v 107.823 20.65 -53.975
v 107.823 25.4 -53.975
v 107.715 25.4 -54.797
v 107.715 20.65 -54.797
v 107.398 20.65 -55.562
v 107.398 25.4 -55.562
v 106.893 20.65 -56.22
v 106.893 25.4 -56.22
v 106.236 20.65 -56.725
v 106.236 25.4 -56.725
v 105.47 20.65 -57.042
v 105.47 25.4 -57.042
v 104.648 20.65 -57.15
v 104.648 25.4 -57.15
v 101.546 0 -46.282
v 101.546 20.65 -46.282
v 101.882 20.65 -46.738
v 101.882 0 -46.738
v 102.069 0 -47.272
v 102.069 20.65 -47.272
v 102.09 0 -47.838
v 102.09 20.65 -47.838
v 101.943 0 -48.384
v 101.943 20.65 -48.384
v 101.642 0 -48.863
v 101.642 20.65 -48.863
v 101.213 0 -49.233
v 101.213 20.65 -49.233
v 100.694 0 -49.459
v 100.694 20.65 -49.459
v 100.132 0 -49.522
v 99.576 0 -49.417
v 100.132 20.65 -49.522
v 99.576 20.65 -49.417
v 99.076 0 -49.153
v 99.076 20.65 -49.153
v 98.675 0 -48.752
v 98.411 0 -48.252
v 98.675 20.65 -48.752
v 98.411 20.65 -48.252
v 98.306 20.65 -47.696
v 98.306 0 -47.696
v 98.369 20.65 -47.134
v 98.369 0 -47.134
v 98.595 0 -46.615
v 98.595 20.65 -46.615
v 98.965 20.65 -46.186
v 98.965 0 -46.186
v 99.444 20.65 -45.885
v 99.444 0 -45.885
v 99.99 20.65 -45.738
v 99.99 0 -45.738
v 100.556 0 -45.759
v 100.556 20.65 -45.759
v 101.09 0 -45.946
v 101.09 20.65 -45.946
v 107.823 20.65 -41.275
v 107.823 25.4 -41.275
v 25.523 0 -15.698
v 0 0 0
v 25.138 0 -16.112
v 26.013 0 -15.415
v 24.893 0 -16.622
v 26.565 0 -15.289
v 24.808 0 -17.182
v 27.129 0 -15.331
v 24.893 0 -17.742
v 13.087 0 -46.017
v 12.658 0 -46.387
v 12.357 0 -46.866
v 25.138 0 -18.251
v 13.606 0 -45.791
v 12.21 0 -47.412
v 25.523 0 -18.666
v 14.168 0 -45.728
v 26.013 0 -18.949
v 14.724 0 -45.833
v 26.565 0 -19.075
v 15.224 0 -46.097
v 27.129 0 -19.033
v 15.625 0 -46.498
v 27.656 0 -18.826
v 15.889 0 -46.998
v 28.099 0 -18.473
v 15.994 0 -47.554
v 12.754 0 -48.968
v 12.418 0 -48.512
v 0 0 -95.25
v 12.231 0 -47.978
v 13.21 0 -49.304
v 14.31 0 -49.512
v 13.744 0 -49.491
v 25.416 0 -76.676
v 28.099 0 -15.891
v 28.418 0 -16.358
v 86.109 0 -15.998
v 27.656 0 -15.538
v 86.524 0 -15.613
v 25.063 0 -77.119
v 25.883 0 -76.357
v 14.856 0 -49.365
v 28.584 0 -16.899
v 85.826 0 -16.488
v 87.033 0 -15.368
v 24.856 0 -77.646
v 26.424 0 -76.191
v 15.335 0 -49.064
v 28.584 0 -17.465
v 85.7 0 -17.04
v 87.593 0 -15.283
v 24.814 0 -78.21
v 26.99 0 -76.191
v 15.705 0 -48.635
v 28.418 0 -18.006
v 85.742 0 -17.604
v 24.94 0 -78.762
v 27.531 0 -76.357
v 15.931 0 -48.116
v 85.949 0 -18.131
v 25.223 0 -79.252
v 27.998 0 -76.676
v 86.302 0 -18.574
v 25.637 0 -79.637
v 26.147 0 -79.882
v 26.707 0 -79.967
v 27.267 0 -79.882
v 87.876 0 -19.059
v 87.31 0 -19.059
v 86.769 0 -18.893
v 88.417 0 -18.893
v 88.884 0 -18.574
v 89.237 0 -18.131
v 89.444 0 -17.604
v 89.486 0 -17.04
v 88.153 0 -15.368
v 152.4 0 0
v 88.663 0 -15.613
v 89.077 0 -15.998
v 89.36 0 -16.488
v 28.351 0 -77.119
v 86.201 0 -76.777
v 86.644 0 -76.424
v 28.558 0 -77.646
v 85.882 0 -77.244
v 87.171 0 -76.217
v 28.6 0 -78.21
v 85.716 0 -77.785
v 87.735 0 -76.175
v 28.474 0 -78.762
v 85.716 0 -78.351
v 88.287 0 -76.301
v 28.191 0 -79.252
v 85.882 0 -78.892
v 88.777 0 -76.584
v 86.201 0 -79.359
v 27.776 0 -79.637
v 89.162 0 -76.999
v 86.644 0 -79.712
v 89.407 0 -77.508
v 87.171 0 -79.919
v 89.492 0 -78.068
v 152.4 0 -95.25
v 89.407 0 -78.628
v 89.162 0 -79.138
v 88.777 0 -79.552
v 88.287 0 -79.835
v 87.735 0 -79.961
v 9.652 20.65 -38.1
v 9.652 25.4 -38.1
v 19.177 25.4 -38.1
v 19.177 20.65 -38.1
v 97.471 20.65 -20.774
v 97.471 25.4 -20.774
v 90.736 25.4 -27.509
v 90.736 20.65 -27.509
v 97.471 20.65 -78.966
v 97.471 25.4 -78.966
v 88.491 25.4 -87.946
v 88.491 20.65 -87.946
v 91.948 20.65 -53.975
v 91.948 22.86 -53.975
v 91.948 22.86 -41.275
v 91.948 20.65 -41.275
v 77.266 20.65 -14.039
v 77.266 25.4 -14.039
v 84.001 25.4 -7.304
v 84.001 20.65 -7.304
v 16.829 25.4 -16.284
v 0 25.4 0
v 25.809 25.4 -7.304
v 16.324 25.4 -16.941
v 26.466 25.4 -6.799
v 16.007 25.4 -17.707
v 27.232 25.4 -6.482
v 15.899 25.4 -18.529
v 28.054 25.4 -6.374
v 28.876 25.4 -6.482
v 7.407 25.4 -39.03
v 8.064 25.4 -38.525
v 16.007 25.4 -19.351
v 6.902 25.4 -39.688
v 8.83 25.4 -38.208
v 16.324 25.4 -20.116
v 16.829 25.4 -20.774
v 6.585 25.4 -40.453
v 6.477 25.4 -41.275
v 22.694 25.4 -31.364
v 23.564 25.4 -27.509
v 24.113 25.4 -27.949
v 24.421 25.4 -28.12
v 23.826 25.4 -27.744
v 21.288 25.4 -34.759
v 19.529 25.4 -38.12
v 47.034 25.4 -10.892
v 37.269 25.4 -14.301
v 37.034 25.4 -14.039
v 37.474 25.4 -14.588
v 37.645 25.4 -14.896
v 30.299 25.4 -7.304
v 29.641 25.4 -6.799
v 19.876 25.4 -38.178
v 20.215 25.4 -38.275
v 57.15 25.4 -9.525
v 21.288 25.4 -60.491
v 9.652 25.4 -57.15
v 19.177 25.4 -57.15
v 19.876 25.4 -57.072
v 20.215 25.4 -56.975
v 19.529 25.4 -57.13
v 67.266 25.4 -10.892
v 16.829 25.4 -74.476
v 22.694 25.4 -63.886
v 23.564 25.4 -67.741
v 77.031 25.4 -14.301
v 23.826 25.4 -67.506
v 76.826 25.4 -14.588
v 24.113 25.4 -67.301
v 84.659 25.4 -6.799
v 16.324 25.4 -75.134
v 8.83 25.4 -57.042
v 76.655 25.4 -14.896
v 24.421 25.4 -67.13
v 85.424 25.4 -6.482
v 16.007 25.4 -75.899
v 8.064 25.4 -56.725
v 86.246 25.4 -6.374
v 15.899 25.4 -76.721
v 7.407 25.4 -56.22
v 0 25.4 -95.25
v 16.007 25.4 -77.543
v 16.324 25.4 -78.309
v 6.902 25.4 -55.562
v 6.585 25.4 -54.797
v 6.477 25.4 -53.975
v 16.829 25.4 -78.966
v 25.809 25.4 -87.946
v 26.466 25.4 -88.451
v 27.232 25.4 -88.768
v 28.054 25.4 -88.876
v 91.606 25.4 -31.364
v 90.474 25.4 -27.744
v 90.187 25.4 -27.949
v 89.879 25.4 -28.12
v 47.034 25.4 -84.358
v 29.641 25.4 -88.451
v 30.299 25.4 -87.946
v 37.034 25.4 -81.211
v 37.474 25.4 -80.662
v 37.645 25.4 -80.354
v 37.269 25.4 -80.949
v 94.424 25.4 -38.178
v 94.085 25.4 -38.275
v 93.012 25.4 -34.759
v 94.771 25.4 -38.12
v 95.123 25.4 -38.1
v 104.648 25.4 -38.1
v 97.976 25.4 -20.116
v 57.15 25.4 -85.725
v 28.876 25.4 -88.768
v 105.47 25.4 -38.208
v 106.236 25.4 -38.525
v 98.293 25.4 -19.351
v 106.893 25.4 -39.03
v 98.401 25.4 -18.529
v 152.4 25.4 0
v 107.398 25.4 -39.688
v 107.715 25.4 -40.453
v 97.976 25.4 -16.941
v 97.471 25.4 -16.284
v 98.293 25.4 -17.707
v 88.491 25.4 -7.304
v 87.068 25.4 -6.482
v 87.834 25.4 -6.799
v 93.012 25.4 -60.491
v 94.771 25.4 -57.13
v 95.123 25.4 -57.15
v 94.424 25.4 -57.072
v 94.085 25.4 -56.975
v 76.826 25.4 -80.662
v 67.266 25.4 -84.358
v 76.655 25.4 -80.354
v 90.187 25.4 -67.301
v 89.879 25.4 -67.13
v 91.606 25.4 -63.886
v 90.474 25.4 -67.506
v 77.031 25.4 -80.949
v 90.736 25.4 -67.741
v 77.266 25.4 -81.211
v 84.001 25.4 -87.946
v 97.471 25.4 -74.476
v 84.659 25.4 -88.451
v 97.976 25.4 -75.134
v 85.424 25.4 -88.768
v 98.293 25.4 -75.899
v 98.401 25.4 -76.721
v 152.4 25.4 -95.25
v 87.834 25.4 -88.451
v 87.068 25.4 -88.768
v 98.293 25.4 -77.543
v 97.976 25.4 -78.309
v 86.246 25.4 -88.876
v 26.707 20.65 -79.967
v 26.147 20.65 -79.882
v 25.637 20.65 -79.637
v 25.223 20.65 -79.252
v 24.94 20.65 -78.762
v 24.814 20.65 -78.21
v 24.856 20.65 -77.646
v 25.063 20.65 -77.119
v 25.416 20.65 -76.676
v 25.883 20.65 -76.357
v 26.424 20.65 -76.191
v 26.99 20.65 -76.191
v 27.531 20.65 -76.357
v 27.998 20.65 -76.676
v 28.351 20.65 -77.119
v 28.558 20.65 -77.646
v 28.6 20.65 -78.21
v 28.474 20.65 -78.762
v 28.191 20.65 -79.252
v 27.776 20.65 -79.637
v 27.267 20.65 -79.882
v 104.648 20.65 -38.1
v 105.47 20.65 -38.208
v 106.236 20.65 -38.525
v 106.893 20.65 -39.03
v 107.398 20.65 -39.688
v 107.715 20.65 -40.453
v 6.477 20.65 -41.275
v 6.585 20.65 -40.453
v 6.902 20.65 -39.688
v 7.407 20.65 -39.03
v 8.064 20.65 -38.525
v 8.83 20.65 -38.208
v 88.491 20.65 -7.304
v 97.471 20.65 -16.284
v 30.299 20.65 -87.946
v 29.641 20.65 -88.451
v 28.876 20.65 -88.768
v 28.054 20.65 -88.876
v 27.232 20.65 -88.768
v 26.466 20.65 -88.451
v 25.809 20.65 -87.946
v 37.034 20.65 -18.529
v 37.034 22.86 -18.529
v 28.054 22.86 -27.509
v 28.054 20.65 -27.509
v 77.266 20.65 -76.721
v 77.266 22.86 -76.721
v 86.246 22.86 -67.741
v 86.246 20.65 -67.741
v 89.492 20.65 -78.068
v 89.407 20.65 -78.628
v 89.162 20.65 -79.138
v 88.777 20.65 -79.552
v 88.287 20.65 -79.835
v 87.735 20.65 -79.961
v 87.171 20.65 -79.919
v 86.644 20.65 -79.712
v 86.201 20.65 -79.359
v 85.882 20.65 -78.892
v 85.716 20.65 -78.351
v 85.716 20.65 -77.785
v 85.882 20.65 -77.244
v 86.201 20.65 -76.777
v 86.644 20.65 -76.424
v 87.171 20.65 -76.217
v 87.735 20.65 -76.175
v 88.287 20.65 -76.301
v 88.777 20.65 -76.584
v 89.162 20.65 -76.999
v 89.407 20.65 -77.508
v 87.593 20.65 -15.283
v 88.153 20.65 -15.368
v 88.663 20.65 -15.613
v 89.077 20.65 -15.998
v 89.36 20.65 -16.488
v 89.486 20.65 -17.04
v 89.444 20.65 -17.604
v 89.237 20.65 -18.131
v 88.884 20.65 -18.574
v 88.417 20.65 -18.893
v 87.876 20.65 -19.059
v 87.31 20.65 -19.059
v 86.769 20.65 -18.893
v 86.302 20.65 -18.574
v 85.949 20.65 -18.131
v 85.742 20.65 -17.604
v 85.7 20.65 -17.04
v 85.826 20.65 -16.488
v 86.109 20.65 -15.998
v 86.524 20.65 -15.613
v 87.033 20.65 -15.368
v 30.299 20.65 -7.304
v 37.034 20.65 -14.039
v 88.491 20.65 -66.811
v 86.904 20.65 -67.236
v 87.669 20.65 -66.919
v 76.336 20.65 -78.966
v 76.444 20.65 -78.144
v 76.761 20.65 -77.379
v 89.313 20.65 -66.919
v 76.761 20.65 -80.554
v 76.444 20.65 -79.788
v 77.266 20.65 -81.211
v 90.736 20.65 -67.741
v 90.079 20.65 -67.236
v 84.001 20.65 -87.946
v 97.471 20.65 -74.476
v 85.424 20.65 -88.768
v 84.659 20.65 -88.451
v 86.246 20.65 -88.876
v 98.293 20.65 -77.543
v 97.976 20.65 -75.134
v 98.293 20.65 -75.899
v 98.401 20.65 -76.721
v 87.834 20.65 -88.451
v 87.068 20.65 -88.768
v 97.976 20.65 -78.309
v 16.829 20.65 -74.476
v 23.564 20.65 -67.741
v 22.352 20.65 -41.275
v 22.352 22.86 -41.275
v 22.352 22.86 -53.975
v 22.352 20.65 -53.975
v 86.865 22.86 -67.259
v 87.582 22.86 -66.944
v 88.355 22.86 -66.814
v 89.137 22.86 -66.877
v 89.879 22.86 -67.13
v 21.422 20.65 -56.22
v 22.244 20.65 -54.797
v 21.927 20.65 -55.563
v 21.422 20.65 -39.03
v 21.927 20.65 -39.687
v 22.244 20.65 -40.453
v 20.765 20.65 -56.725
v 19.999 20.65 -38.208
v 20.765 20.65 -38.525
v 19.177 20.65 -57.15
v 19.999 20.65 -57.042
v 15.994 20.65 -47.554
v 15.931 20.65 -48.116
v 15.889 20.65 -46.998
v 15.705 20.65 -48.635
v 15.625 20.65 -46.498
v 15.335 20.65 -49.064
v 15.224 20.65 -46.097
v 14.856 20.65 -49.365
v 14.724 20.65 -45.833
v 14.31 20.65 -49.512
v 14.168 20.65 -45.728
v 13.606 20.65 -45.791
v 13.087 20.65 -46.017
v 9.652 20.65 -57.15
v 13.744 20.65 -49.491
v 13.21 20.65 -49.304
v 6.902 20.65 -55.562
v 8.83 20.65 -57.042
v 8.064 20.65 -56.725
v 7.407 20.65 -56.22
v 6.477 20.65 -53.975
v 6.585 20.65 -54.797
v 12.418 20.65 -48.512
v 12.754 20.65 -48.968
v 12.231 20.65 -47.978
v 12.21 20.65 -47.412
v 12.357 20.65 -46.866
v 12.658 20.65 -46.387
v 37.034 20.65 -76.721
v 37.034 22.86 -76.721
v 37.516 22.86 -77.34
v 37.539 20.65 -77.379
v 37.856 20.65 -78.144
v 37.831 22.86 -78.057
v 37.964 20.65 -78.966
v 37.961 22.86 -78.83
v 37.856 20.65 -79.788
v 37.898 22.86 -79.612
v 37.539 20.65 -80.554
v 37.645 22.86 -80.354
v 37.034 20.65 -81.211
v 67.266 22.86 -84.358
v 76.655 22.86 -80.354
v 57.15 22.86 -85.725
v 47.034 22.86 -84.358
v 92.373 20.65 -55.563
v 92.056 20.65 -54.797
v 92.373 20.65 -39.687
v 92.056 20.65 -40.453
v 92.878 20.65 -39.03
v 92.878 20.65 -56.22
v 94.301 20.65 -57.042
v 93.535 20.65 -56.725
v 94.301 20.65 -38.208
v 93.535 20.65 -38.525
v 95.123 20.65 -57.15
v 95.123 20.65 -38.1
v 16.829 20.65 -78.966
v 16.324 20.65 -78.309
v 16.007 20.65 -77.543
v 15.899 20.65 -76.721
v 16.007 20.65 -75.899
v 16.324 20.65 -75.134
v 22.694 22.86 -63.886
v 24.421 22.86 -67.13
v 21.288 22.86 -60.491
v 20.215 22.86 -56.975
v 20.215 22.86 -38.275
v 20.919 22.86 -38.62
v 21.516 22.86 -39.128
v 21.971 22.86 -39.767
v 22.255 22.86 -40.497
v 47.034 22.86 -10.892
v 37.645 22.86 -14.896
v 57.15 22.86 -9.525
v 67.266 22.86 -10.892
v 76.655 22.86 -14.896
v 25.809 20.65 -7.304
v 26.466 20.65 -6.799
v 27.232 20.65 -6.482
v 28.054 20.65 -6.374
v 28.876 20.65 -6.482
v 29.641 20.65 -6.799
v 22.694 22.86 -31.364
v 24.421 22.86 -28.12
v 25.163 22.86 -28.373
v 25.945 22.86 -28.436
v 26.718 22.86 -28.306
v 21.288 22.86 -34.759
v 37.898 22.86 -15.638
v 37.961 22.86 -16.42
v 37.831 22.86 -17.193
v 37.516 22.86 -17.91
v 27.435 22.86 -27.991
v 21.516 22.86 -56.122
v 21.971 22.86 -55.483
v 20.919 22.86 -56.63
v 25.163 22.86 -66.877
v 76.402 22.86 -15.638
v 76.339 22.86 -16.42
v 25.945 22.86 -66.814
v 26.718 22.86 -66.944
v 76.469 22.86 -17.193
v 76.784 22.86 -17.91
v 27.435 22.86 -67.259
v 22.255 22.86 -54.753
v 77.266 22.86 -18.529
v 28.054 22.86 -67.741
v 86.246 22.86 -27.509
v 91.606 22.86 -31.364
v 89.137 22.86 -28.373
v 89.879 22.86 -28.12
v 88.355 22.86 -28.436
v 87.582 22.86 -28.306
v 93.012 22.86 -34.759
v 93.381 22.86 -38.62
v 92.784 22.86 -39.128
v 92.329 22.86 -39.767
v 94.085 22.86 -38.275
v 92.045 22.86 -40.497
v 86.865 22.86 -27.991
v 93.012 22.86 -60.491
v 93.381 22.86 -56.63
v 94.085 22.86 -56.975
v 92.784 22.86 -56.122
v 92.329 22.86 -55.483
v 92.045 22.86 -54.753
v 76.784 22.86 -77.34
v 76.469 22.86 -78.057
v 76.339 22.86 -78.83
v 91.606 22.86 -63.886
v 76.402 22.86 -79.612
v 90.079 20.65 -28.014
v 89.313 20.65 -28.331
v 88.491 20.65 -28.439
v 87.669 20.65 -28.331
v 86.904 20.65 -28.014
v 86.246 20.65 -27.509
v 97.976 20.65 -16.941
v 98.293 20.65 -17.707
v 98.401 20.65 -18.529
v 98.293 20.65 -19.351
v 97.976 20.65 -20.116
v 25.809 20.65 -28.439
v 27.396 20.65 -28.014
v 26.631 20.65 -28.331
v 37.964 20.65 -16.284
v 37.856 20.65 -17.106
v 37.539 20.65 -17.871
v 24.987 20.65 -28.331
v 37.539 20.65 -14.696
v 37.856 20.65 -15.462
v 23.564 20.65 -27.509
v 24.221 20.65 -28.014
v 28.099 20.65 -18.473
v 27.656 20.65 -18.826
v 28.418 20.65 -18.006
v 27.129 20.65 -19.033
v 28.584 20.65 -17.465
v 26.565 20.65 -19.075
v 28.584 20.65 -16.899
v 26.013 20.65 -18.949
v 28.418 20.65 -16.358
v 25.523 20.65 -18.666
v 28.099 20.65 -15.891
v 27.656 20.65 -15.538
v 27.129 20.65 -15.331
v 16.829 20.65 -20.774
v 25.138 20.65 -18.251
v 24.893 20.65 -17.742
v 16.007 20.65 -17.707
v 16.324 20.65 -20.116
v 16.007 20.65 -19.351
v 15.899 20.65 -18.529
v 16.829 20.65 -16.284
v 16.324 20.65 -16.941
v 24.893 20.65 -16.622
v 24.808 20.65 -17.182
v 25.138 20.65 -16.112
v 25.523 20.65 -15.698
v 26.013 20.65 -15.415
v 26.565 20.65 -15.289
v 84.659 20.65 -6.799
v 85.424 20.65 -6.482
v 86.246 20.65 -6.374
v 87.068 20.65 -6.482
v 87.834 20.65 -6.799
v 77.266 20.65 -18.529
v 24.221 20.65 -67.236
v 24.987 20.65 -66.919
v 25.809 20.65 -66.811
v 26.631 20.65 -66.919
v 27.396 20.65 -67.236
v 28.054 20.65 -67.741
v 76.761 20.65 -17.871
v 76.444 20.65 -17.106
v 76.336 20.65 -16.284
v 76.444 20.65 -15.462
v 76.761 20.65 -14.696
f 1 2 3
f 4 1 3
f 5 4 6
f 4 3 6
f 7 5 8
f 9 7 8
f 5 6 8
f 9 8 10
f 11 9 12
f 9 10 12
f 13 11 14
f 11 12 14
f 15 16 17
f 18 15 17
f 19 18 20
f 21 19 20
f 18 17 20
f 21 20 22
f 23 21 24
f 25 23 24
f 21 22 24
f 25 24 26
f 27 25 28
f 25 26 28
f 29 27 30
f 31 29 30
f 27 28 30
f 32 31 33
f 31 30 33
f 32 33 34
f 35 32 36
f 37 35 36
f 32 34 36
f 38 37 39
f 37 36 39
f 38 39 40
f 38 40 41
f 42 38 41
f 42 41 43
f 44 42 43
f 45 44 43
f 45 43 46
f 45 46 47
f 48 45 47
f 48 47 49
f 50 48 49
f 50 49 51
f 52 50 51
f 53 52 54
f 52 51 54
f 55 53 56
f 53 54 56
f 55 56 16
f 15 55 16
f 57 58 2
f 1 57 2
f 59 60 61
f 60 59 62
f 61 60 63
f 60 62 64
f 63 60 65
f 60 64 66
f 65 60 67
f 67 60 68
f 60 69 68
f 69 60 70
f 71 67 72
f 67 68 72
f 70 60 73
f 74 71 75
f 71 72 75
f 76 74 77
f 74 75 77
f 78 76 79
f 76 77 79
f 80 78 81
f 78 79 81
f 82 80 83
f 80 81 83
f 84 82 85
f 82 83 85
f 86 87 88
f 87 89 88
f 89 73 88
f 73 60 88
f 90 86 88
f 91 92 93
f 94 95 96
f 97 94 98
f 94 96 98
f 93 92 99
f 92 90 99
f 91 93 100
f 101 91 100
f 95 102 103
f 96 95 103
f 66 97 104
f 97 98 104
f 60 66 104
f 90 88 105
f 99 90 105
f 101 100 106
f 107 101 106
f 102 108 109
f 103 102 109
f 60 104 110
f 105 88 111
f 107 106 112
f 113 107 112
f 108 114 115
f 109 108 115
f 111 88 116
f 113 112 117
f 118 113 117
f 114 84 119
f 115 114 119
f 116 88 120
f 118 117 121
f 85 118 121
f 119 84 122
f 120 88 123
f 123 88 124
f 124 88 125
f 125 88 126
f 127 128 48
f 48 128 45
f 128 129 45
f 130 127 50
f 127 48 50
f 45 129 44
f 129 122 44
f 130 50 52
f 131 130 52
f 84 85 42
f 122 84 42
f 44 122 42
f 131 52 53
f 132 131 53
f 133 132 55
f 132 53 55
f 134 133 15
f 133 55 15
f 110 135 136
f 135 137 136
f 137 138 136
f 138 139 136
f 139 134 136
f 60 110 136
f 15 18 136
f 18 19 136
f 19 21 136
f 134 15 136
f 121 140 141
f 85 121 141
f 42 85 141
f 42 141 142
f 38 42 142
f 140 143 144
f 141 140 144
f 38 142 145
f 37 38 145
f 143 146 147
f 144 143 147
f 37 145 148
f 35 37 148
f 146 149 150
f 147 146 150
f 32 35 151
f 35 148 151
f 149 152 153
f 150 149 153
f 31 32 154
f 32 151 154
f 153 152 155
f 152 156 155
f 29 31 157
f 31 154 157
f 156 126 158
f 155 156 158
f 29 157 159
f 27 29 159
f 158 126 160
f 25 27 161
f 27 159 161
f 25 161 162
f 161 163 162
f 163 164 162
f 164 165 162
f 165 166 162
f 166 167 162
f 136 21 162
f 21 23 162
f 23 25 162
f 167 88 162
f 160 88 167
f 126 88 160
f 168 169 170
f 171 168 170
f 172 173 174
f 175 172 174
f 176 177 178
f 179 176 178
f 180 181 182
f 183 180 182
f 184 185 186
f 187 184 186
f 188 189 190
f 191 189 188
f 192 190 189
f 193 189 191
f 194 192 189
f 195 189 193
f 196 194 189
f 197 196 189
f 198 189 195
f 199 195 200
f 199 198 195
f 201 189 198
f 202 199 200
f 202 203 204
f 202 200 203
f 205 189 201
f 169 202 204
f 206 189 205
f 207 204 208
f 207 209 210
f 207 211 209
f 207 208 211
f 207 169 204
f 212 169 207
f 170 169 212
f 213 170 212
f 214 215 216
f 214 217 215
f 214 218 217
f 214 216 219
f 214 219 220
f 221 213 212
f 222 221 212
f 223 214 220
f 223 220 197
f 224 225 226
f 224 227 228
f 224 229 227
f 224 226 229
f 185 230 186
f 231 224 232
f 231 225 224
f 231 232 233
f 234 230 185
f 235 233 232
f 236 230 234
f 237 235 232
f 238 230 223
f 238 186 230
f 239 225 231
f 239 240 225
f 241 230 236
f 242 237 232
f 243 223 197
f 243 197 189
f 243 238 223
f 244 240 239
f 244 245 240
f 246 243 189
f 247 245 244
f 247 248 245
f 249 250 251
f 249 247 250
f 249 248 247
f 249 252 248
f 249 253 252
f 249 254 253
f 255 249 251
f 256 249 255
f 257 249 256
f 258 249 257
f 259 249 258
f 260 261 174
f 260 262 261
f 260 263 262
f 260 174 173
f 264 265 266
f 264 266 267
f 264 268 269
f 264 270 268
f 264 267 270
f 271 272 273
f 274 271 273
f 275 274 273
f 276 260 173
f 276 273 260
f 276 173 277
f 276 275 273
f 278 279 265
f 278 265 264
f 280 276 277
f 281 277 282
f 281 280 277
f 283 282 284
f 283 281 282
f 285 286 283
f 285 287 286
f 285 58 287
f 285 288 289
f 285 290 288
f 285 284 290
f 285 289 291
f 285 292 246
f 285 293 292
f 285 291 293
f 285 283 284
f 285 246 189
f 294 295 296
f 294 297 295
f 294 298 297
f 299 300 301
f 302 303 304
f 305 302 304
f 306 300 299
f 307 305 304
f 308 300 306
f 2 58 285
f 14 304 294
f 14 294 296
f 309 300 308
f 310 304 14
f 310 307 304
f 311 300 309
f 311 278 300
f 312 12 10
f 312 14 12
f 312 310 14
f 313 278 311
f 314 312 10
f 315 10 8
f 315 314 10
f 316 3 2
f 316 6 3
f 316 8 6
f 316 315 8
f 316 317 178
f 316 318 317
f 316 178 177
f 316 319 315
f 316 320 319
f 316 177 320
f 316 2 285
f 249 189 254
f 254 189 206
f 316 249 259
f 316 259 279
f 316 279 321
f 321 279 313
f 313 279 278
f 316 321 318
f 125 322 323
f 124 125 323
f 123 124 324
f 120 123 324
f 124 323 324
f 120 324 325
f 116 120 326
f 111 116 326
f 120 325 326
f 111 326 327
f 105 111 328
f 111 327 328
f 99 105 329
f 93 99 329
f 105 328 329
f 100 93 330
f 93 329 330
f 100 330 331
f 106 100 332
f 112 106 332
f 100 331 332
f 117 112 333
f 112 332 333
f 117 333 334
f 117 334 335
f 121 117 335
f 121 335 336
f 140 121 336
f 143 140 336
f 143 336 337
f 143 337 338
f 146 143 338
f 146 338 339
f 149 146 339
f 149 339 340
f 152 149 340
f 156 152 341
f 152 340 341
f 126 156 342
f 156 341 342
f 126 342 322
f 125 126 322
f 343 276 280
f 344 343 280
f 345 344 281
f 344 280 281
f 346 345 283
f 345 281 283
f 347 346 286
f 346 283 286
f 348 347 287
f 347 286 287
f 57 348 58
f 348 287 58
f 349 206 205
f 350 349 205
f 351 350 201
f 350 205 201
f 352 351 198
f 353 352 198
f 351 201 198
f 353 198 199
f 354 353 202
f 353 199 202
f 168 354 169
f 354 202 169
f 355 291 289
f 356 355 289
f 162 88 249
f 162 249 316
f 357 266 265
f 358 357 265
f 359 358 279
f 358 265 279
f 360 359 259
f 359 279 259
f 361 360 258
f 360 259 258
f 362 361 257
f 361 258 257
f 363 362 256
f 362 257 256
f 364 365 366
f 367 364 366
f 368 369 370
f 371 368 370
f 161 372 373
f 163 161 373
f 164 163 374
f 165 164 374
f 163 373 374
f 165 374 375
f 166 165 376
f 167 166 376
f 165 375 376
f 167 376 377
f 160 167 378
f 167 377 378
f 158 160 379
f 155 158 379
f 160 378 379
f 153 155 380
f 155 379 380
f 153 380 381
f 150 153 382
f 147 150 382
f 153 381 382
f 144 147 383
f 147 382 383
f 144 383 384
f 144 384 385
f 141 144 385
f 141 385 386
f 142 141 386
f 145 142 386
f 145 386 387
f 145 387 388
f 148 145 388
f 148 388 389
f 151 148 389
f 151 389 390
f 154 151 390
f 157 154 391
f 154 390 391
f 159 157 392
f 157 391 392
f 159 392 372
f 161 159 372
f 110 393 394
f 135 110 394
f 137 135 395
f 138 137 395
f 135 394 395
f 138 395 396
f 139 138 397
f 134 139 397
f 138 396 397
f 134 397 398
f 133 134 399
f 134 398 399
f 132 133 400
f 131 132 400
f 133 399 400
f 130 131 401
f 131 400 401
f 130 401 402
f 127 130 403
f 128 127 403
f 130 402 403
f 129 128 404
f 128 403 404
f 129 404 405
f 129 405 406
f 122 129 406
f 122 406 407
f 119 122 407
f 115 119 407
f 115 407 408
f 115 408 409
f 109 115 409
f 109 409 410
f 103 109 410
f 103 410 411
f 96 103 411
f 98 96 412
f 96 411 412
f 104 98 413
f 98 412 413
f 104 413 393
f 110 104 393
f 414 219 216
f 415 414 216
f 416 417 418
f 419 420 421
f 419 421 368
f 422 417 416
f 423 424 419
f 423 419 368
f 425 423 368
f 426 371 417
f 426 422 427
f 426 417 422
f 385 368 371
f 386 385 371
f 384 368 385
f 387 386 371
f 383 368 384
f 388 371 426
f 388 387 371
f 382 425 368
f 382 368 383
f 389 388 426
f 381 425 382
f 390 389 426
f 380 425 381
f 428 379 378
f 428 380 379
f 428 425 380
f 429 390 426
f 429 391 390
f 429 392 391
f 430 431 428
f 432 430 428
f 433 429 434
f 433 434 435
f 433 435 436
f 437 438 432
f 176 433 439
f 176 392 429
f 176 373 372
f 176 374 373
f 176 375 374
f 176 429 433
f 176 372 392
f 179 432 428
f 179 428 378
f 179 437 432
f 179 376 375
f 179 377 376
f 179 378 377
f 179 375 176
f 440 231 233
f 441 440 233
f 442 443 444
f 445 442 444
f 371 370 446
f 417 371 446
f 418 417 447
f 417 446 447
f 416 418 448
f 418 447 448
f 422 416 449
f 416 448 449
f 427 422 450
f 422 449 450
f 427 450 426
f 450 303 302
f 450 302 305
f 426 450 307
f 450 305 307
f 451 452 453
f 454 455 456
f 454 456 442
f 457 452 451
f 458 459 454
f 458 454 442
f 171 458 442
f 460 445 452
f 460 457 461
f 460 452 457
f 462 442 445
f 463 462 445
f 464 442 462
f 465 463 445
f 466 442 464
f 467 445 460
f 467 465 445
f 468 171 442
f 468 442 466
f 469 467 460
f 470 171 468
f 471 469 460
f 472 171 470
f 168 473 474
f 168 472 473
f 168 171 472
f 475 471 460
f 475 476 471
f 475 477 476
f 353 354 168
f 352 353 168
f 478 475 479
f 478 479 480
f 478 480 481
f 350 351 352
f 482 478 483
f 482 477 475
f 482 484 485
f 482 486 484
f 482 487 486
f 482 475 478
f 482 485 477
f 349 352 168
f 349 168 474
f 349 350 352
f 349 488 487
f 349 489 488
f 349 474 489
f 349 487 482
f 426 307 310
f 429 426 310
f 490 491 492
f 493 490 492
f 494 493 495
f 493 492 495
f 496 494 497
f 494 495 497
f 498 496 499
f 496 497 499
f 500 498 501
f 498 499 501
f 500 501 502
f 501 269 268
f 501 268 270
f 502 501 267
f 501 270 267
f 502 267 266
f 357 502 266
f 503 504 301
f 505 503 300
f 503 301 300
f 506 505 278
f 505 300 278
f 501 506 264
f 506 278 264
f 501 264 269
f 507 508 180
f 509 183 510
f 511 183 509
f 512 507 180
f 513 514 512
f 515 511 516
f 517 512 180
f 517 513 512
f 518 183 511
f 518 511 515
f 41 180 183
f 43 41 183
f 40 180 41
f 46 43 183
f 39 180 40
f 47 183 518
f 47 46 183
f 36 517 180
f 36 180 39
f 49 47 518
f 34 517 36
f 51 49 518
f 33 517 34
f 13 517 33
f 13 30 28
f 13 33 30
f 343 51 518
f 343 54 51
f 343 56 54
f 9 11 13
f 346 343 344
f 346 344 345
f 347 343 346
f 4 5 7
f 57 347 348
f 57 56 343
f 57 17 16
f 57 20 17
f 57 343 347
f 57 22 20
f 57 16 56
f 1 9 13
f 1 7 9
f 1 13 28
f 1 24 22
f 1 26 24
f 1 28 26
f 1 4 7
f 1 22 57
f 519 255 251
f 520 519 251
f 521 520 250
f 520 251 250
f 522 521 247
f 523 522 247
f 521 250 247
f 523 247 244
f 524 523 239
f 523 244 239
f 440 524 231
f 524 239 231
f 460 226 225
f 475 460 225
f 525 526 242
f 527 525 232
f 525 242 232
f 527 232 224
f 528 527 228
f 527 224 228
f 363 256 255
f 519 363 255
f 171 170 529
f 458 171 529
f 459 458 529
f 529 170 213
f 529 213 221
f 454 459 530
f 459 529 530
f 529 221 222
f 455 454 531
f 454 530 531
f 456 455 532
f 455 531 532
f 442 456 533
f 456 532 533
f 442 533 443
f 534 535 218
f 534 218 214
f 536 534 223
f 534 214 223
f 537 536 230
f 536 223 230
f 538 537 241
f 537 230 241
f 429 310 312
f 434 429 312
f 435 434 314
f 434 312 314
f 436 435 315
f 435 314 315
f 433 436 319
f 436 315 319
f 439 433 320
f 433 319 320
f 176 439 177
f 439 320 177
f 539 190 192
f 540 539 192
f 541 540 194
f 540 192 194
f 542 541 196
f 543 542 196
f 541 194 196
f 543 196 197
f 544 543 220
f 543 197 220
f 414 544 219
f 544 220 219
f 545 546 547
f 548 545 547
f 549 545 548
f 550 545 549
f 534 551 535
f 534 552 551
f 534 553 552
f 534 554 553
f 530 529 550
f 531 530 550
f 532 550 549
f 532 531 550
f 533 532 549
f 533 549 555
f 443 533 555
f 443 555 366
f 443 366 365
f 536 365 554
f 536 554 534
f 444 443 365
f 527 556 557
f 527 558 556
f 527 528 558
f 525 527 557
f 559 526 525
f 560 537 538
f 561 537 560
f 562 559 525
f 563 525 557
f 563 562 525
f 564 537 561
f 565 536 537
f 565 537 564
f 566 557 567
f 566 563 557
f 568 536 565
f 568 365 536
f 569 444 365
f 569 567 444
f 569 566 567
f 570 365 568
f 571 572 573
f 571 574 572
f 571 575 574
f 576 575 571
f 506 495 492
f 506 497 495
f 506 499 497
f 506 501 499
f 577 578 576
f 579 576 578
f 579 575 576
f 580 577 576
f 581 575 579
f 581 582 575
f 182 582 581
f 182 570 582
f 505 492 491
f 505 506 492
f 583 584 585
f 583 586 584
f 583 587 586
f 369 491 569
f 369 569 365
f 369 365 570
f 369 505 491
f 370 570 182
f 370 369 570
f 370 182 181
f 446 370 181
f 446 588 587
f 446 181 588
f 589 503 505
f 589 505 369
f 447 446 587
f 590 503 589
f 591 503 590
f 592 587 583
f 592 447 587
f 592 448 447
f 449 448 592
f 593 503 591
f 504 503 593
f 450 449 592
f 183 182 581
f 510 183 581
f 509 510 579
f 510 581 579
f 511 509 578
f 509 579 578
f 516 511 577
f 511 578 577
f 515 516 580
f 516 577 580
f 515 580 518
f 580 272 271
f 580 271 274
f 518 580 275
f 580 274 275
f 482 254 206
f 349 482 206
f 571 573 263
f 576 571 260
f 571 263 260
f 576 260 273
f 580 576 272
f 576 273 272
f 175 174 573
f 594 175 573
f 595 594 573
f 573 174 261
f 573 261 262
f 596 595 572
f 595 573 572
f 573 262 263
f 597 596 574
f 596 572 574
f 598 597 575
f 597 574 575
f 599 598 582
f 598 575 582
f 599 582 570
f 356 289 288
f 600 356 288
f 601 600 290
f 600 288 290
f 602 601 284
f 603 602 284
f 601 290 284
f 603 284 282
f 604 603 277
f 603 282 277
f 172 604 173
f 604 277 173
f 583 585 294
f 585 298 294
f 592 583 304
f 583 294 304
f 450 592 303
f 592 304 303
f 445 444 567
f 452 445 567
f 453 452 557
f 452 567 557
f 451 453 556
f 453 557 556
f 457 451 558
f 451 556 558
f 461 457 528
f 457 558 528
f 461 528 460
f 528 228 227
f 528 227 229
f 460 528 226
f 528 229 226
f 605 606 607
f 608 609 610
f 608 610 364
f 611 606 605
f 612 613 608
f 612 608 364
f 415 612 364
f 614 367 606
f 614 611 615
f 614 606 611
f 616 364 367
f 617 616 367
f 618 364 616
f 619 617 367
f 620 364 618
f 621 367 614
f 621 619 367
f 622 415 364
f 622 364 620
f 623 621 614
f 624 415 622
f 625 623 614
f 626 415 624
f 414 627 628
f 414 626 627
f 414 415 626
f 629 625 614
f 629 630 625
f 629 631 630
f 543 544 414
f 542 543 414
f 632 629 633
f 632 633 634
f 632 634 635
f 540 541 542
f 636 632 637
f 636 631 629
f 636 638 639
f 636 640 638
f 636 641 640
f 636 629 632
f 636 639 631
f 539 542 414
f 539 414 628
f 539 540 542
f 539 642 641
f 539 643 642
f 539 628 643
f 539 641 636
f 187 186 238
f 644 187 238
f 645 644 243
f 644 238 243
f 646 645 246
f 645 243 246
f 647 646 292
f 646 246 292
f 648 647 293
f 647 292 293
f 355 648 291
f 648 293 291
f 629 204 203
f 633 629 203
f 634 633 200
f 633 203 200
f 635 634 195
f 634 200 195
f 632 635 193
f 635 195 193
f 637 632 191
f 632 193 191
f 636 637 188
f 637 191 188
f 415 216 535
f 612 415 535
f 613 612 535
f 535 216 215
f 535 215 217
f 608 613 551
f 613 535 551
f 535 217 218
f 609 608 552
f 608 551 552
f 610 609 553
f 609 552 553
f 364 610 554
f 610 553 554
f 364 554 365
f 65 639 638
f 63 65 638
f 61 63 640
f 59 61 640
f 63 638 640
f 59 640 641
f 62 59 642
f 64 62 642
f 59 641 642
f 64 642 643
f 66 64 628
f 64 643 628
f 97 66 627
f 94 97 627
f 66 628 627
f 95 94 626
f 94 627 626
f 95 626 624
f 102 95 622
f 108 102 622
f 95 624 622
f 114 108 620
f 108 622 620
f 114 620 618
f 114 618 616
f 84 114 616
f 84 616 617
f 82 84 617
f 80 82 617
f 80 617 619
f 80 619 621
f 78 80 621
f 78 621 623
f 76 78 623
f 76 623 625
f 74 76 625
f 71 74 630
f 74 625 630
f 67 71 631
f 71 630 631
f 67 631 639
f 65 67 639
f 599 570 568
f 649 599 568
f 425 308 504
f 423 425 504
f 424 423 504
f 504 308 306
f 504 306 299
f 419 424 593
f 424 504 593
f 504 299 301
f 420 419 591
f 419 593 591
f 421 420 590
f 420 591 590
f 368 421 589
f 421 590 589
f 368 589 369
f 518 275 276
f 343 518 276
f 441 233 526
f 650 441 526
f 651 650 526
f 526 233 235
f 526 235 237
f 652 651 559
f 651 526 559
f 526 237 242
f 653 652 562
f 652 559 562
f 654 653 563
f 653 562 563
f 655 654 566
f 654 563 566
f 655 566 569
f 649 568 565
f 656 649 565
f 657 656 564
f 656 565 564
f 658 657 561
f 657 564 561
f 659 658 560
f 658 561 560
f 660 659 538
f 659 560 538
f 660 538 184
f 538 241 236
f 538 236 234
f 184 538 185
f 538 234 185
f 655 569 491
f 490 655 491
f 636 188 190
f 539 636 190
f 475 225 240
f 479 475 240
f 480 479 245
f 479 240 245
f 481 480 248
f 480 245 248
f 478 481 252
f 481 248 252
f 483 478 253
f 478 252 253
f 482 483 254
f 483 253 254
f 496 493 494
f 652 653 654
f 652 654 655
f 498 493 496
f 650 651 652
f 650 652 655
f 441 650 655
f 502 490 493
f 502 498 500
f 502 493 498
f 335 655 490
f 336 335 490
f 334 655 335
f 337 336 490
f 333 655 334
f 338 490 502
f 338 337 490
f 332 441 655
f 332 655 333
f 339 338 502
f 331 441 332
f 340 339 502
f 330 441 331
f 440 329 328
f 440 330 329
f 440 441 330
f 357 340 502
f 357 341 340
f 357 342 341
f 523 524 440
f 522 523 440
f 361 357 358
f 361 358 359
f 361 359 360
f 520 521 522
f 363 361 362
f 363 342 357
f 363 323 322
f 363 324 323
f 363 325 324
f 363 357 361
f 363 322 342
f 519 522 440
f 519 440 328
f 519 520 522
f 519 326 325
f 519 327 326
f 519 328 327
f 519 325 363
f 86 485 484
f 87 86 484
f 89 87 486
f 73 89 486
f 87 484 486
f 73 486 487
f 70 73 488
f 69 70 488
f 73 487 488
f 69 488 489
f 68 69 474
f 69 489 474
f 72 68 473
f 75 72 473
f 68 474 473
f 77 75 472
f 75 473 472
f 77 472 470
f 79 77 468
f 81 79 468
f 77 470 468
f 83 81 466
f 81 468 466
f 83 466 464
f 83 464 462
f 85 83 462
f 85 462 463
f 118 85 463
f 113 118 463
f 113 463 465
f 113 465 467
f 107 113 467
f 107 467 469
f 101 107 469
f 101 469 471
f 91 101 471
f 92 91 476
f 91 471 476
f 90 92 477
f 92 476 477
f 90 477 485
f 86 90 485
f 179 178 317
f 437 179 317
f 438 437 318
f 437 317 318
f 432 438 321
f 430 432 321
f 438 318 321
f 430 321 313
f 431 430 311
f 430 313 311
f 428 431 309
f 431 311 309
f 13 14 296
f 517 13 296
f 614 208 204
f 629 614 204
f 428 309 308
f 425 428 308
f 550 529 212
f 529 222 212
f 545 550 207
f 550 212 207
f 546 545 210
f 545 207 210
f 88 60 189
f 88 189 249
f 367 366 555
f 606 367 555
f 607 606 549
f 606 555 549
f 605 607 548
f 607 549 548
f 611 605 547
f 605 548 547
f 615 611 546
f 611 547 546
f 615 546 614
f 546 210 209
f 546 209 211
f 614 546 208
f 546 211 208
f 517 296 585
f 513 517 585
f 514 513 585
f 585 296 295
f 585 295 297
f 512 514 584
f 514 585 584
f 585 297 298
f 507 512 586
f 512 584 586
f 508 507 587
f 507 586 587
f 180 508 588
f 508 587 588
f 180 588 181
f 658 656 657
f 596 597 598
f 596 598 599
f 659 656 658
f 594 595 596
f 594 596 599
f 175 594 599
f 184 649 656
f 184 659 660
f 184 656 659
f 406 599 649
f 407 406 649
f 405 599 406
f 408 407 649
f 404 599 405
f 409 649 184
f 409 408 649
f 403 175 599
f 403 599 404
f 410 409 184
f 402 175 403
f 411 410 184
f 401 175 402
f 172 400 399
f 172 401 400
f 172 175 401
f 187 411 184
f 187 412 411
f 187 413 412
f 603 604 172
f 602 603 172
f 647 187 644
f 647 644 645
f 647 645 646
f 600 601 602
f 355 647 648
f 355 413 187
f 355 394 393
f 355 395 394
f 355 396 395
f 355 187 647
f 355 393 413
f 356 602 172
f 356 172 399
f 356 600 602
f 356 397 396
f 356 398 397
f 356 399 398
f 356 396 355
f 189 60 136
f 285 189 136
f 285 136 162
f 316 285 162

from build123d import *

# Parameters (mm, degrees)
SKETCH1_W                       = 152.4
SKETCH1_H                       = 95.25
BOSS_EXTRUDE1_DEPTH             = 25.4
SKETCH2_R                       = 38.1
F_3IN_POCKET_DEPTH              = 2.54
CLAMP_POCKET_DEPTH              = 4.7498
SKETCH4_R                       = 1.89865
NO25_THREAD_FORM_FOR_8_32_DEPTH = 20.6502
FOUR_CLAMPS_COUNT               = 4
F_180_CLAMP_COUNT               = 2
F_180_CLAMP_ANGLE               = 135
F_360_CLAMP_COUNT               = 2
F_360_CLAMP_ANGLE               = 315


with BuildPart() as part:
    # Sketch1 → Boss-Extrude1 (new body)
    with BuildSketch(Plane(origin=(0, 0, 0), x_dir=(1, 0, 0), z_dir=(0, 1, 0))):
        with Locations((76.2, 47.625)):
            Rectangle(SKETCH1_W, SKETCH1_H)
    extrude(amount=BOSS_EXTRUDE1_DEPTH)

    # Sketch2 → 3in Pocket (cut)
    with BuildSketch(Plane(origin=(0, 25.4, 0), x_dir=(1, 0, 0), z_dir=(0, 1, 0))):
        with Locations((57.15, 47.625)):
            Circle(SKETCH2_R)
    extrude(amount=-F_3IN_POCKET_DEPTH, mode=Mode.SUBTRACT)

    # Sketch3 → Clamp Pocket (cut)
    with BuildSketch(Plane(origin=(0, 25.4, 0), x_dir=(1, 0, 0), z_dir=(0, 1, 0))):
        with BuildLine():
            Line((90.736157893, 67.740773711), (97.471349984, 74.475965802))
            ThreePointArc((97.471349984, 74.475965802), (98.401285953, 76.721029832), (97.471349984, 78.966093863))
            Line((97.471349984, 78.966093863), (88.491093863, 87.946349984))
            ThreePointArc((88.491093863, 87.946349984), (86.246029832, 88.876285953), (84.000965802, 87.946349984))
            Line((84.000965802, 87.946349984), (77.265773711, 81.211157893))
            ThreePointArc((77.265773711, 81.211157893), (76.335837741, 78.966093863), (77.265773711, 76.721029832))
            Line((77.265773711, 76.721029832), (86.246029832, 67.740773711))
            ThreePointArc((86.246029832, 67.740773711), (88.491093863, 66.810837741), (90.736157893, 67.740773711))
        make_face()
    clamp_pocket = extrude(amount=-CLAMP_POCKET_DEPTH, mode=Mode.SUBTRACT)

    # Sketch4 → No25 Thread Form for 8-32 (cut)
    with BuildSketch(Plane(origin=(0, 20.6502, 0), x_dir=(1, 0, 0), z_dir=(0, 1, 0))):
        with Locations((87.59306825, 78.06806825)):
            Circle(SKETCH4_R)
    no25_thread_form_for_8_32 = extrude(amount=-NO25_THREAD_FORM_FOR_8_32_DEPTH, mode=Mode.SUBTRACT)

    # Four Clamps: Clamp Pocket, No25 Thread Form for 8-32 ×4 about axis
    four_clamps_axis = Axis((57.15, 0, -47.625), (0, 1, 0))
    for i in range(1, FOUR_CLAMPS_COUNT):
        add(clamp_pocket.rotate(four_clamps_axis, i * 360 / FOUR_CLAMPS_COUNT), mode=Mode.SUBTRACT)
        add(no25_thread_form_for_8_32.rotate(four_clamps_axis, i * 360 / FOUR_CLAMPS_COUNT), mode=Mode.SUBTRACT)

    # 180 Clamp: Clamp Pocket, No25 Thread Form for 8-32 ×2 about axis
    f_180_clamp_axis = Axis((57.15, 0, -47.625), (0, 1, 0))
    for i in range(1, F_180_CLAMP_COUNT):
        add(clamp_pocket.rotate(f_180_clamp_axis, i * F_180_CLAMP_ANGLE / (F_180_CLAMP_COUNT - 1)), mode=Mode.SUBTRACT)
        add(no25_thread_form_for_8_32.rotate(f_180_clamp_axis, i * F_180_CLAMP_ANGLE / (F_180_CLAMP_COUNT - 1)), mode=Mode.SUBTRACT)

    # 360 Clamp: Clamp Pocket, No25 Thread Form for 8-32 ×2 about axis
    f_360_clamp_axis = Axis((57.15, 25.4, -47.625), (0, 1, 0))
    for i in range(1, F_360_CLAMP_COUNT):
        add(clamp_pocket.rotate(f_360_clamp_axis, i * F_360_CLAMP_ANGLE / (F_360_CLAMP_COUNT - 1)), mode=Mode.SUBTRACT)
        add(no25_thread_form_for_8_32.rotate(f_360_clamp_axis, i * F_360_CLAMP_ANGLE / (F_360_CLAMP_COUNT - 1)), mode=Mode.SUBTRACT)


solid = part.part
